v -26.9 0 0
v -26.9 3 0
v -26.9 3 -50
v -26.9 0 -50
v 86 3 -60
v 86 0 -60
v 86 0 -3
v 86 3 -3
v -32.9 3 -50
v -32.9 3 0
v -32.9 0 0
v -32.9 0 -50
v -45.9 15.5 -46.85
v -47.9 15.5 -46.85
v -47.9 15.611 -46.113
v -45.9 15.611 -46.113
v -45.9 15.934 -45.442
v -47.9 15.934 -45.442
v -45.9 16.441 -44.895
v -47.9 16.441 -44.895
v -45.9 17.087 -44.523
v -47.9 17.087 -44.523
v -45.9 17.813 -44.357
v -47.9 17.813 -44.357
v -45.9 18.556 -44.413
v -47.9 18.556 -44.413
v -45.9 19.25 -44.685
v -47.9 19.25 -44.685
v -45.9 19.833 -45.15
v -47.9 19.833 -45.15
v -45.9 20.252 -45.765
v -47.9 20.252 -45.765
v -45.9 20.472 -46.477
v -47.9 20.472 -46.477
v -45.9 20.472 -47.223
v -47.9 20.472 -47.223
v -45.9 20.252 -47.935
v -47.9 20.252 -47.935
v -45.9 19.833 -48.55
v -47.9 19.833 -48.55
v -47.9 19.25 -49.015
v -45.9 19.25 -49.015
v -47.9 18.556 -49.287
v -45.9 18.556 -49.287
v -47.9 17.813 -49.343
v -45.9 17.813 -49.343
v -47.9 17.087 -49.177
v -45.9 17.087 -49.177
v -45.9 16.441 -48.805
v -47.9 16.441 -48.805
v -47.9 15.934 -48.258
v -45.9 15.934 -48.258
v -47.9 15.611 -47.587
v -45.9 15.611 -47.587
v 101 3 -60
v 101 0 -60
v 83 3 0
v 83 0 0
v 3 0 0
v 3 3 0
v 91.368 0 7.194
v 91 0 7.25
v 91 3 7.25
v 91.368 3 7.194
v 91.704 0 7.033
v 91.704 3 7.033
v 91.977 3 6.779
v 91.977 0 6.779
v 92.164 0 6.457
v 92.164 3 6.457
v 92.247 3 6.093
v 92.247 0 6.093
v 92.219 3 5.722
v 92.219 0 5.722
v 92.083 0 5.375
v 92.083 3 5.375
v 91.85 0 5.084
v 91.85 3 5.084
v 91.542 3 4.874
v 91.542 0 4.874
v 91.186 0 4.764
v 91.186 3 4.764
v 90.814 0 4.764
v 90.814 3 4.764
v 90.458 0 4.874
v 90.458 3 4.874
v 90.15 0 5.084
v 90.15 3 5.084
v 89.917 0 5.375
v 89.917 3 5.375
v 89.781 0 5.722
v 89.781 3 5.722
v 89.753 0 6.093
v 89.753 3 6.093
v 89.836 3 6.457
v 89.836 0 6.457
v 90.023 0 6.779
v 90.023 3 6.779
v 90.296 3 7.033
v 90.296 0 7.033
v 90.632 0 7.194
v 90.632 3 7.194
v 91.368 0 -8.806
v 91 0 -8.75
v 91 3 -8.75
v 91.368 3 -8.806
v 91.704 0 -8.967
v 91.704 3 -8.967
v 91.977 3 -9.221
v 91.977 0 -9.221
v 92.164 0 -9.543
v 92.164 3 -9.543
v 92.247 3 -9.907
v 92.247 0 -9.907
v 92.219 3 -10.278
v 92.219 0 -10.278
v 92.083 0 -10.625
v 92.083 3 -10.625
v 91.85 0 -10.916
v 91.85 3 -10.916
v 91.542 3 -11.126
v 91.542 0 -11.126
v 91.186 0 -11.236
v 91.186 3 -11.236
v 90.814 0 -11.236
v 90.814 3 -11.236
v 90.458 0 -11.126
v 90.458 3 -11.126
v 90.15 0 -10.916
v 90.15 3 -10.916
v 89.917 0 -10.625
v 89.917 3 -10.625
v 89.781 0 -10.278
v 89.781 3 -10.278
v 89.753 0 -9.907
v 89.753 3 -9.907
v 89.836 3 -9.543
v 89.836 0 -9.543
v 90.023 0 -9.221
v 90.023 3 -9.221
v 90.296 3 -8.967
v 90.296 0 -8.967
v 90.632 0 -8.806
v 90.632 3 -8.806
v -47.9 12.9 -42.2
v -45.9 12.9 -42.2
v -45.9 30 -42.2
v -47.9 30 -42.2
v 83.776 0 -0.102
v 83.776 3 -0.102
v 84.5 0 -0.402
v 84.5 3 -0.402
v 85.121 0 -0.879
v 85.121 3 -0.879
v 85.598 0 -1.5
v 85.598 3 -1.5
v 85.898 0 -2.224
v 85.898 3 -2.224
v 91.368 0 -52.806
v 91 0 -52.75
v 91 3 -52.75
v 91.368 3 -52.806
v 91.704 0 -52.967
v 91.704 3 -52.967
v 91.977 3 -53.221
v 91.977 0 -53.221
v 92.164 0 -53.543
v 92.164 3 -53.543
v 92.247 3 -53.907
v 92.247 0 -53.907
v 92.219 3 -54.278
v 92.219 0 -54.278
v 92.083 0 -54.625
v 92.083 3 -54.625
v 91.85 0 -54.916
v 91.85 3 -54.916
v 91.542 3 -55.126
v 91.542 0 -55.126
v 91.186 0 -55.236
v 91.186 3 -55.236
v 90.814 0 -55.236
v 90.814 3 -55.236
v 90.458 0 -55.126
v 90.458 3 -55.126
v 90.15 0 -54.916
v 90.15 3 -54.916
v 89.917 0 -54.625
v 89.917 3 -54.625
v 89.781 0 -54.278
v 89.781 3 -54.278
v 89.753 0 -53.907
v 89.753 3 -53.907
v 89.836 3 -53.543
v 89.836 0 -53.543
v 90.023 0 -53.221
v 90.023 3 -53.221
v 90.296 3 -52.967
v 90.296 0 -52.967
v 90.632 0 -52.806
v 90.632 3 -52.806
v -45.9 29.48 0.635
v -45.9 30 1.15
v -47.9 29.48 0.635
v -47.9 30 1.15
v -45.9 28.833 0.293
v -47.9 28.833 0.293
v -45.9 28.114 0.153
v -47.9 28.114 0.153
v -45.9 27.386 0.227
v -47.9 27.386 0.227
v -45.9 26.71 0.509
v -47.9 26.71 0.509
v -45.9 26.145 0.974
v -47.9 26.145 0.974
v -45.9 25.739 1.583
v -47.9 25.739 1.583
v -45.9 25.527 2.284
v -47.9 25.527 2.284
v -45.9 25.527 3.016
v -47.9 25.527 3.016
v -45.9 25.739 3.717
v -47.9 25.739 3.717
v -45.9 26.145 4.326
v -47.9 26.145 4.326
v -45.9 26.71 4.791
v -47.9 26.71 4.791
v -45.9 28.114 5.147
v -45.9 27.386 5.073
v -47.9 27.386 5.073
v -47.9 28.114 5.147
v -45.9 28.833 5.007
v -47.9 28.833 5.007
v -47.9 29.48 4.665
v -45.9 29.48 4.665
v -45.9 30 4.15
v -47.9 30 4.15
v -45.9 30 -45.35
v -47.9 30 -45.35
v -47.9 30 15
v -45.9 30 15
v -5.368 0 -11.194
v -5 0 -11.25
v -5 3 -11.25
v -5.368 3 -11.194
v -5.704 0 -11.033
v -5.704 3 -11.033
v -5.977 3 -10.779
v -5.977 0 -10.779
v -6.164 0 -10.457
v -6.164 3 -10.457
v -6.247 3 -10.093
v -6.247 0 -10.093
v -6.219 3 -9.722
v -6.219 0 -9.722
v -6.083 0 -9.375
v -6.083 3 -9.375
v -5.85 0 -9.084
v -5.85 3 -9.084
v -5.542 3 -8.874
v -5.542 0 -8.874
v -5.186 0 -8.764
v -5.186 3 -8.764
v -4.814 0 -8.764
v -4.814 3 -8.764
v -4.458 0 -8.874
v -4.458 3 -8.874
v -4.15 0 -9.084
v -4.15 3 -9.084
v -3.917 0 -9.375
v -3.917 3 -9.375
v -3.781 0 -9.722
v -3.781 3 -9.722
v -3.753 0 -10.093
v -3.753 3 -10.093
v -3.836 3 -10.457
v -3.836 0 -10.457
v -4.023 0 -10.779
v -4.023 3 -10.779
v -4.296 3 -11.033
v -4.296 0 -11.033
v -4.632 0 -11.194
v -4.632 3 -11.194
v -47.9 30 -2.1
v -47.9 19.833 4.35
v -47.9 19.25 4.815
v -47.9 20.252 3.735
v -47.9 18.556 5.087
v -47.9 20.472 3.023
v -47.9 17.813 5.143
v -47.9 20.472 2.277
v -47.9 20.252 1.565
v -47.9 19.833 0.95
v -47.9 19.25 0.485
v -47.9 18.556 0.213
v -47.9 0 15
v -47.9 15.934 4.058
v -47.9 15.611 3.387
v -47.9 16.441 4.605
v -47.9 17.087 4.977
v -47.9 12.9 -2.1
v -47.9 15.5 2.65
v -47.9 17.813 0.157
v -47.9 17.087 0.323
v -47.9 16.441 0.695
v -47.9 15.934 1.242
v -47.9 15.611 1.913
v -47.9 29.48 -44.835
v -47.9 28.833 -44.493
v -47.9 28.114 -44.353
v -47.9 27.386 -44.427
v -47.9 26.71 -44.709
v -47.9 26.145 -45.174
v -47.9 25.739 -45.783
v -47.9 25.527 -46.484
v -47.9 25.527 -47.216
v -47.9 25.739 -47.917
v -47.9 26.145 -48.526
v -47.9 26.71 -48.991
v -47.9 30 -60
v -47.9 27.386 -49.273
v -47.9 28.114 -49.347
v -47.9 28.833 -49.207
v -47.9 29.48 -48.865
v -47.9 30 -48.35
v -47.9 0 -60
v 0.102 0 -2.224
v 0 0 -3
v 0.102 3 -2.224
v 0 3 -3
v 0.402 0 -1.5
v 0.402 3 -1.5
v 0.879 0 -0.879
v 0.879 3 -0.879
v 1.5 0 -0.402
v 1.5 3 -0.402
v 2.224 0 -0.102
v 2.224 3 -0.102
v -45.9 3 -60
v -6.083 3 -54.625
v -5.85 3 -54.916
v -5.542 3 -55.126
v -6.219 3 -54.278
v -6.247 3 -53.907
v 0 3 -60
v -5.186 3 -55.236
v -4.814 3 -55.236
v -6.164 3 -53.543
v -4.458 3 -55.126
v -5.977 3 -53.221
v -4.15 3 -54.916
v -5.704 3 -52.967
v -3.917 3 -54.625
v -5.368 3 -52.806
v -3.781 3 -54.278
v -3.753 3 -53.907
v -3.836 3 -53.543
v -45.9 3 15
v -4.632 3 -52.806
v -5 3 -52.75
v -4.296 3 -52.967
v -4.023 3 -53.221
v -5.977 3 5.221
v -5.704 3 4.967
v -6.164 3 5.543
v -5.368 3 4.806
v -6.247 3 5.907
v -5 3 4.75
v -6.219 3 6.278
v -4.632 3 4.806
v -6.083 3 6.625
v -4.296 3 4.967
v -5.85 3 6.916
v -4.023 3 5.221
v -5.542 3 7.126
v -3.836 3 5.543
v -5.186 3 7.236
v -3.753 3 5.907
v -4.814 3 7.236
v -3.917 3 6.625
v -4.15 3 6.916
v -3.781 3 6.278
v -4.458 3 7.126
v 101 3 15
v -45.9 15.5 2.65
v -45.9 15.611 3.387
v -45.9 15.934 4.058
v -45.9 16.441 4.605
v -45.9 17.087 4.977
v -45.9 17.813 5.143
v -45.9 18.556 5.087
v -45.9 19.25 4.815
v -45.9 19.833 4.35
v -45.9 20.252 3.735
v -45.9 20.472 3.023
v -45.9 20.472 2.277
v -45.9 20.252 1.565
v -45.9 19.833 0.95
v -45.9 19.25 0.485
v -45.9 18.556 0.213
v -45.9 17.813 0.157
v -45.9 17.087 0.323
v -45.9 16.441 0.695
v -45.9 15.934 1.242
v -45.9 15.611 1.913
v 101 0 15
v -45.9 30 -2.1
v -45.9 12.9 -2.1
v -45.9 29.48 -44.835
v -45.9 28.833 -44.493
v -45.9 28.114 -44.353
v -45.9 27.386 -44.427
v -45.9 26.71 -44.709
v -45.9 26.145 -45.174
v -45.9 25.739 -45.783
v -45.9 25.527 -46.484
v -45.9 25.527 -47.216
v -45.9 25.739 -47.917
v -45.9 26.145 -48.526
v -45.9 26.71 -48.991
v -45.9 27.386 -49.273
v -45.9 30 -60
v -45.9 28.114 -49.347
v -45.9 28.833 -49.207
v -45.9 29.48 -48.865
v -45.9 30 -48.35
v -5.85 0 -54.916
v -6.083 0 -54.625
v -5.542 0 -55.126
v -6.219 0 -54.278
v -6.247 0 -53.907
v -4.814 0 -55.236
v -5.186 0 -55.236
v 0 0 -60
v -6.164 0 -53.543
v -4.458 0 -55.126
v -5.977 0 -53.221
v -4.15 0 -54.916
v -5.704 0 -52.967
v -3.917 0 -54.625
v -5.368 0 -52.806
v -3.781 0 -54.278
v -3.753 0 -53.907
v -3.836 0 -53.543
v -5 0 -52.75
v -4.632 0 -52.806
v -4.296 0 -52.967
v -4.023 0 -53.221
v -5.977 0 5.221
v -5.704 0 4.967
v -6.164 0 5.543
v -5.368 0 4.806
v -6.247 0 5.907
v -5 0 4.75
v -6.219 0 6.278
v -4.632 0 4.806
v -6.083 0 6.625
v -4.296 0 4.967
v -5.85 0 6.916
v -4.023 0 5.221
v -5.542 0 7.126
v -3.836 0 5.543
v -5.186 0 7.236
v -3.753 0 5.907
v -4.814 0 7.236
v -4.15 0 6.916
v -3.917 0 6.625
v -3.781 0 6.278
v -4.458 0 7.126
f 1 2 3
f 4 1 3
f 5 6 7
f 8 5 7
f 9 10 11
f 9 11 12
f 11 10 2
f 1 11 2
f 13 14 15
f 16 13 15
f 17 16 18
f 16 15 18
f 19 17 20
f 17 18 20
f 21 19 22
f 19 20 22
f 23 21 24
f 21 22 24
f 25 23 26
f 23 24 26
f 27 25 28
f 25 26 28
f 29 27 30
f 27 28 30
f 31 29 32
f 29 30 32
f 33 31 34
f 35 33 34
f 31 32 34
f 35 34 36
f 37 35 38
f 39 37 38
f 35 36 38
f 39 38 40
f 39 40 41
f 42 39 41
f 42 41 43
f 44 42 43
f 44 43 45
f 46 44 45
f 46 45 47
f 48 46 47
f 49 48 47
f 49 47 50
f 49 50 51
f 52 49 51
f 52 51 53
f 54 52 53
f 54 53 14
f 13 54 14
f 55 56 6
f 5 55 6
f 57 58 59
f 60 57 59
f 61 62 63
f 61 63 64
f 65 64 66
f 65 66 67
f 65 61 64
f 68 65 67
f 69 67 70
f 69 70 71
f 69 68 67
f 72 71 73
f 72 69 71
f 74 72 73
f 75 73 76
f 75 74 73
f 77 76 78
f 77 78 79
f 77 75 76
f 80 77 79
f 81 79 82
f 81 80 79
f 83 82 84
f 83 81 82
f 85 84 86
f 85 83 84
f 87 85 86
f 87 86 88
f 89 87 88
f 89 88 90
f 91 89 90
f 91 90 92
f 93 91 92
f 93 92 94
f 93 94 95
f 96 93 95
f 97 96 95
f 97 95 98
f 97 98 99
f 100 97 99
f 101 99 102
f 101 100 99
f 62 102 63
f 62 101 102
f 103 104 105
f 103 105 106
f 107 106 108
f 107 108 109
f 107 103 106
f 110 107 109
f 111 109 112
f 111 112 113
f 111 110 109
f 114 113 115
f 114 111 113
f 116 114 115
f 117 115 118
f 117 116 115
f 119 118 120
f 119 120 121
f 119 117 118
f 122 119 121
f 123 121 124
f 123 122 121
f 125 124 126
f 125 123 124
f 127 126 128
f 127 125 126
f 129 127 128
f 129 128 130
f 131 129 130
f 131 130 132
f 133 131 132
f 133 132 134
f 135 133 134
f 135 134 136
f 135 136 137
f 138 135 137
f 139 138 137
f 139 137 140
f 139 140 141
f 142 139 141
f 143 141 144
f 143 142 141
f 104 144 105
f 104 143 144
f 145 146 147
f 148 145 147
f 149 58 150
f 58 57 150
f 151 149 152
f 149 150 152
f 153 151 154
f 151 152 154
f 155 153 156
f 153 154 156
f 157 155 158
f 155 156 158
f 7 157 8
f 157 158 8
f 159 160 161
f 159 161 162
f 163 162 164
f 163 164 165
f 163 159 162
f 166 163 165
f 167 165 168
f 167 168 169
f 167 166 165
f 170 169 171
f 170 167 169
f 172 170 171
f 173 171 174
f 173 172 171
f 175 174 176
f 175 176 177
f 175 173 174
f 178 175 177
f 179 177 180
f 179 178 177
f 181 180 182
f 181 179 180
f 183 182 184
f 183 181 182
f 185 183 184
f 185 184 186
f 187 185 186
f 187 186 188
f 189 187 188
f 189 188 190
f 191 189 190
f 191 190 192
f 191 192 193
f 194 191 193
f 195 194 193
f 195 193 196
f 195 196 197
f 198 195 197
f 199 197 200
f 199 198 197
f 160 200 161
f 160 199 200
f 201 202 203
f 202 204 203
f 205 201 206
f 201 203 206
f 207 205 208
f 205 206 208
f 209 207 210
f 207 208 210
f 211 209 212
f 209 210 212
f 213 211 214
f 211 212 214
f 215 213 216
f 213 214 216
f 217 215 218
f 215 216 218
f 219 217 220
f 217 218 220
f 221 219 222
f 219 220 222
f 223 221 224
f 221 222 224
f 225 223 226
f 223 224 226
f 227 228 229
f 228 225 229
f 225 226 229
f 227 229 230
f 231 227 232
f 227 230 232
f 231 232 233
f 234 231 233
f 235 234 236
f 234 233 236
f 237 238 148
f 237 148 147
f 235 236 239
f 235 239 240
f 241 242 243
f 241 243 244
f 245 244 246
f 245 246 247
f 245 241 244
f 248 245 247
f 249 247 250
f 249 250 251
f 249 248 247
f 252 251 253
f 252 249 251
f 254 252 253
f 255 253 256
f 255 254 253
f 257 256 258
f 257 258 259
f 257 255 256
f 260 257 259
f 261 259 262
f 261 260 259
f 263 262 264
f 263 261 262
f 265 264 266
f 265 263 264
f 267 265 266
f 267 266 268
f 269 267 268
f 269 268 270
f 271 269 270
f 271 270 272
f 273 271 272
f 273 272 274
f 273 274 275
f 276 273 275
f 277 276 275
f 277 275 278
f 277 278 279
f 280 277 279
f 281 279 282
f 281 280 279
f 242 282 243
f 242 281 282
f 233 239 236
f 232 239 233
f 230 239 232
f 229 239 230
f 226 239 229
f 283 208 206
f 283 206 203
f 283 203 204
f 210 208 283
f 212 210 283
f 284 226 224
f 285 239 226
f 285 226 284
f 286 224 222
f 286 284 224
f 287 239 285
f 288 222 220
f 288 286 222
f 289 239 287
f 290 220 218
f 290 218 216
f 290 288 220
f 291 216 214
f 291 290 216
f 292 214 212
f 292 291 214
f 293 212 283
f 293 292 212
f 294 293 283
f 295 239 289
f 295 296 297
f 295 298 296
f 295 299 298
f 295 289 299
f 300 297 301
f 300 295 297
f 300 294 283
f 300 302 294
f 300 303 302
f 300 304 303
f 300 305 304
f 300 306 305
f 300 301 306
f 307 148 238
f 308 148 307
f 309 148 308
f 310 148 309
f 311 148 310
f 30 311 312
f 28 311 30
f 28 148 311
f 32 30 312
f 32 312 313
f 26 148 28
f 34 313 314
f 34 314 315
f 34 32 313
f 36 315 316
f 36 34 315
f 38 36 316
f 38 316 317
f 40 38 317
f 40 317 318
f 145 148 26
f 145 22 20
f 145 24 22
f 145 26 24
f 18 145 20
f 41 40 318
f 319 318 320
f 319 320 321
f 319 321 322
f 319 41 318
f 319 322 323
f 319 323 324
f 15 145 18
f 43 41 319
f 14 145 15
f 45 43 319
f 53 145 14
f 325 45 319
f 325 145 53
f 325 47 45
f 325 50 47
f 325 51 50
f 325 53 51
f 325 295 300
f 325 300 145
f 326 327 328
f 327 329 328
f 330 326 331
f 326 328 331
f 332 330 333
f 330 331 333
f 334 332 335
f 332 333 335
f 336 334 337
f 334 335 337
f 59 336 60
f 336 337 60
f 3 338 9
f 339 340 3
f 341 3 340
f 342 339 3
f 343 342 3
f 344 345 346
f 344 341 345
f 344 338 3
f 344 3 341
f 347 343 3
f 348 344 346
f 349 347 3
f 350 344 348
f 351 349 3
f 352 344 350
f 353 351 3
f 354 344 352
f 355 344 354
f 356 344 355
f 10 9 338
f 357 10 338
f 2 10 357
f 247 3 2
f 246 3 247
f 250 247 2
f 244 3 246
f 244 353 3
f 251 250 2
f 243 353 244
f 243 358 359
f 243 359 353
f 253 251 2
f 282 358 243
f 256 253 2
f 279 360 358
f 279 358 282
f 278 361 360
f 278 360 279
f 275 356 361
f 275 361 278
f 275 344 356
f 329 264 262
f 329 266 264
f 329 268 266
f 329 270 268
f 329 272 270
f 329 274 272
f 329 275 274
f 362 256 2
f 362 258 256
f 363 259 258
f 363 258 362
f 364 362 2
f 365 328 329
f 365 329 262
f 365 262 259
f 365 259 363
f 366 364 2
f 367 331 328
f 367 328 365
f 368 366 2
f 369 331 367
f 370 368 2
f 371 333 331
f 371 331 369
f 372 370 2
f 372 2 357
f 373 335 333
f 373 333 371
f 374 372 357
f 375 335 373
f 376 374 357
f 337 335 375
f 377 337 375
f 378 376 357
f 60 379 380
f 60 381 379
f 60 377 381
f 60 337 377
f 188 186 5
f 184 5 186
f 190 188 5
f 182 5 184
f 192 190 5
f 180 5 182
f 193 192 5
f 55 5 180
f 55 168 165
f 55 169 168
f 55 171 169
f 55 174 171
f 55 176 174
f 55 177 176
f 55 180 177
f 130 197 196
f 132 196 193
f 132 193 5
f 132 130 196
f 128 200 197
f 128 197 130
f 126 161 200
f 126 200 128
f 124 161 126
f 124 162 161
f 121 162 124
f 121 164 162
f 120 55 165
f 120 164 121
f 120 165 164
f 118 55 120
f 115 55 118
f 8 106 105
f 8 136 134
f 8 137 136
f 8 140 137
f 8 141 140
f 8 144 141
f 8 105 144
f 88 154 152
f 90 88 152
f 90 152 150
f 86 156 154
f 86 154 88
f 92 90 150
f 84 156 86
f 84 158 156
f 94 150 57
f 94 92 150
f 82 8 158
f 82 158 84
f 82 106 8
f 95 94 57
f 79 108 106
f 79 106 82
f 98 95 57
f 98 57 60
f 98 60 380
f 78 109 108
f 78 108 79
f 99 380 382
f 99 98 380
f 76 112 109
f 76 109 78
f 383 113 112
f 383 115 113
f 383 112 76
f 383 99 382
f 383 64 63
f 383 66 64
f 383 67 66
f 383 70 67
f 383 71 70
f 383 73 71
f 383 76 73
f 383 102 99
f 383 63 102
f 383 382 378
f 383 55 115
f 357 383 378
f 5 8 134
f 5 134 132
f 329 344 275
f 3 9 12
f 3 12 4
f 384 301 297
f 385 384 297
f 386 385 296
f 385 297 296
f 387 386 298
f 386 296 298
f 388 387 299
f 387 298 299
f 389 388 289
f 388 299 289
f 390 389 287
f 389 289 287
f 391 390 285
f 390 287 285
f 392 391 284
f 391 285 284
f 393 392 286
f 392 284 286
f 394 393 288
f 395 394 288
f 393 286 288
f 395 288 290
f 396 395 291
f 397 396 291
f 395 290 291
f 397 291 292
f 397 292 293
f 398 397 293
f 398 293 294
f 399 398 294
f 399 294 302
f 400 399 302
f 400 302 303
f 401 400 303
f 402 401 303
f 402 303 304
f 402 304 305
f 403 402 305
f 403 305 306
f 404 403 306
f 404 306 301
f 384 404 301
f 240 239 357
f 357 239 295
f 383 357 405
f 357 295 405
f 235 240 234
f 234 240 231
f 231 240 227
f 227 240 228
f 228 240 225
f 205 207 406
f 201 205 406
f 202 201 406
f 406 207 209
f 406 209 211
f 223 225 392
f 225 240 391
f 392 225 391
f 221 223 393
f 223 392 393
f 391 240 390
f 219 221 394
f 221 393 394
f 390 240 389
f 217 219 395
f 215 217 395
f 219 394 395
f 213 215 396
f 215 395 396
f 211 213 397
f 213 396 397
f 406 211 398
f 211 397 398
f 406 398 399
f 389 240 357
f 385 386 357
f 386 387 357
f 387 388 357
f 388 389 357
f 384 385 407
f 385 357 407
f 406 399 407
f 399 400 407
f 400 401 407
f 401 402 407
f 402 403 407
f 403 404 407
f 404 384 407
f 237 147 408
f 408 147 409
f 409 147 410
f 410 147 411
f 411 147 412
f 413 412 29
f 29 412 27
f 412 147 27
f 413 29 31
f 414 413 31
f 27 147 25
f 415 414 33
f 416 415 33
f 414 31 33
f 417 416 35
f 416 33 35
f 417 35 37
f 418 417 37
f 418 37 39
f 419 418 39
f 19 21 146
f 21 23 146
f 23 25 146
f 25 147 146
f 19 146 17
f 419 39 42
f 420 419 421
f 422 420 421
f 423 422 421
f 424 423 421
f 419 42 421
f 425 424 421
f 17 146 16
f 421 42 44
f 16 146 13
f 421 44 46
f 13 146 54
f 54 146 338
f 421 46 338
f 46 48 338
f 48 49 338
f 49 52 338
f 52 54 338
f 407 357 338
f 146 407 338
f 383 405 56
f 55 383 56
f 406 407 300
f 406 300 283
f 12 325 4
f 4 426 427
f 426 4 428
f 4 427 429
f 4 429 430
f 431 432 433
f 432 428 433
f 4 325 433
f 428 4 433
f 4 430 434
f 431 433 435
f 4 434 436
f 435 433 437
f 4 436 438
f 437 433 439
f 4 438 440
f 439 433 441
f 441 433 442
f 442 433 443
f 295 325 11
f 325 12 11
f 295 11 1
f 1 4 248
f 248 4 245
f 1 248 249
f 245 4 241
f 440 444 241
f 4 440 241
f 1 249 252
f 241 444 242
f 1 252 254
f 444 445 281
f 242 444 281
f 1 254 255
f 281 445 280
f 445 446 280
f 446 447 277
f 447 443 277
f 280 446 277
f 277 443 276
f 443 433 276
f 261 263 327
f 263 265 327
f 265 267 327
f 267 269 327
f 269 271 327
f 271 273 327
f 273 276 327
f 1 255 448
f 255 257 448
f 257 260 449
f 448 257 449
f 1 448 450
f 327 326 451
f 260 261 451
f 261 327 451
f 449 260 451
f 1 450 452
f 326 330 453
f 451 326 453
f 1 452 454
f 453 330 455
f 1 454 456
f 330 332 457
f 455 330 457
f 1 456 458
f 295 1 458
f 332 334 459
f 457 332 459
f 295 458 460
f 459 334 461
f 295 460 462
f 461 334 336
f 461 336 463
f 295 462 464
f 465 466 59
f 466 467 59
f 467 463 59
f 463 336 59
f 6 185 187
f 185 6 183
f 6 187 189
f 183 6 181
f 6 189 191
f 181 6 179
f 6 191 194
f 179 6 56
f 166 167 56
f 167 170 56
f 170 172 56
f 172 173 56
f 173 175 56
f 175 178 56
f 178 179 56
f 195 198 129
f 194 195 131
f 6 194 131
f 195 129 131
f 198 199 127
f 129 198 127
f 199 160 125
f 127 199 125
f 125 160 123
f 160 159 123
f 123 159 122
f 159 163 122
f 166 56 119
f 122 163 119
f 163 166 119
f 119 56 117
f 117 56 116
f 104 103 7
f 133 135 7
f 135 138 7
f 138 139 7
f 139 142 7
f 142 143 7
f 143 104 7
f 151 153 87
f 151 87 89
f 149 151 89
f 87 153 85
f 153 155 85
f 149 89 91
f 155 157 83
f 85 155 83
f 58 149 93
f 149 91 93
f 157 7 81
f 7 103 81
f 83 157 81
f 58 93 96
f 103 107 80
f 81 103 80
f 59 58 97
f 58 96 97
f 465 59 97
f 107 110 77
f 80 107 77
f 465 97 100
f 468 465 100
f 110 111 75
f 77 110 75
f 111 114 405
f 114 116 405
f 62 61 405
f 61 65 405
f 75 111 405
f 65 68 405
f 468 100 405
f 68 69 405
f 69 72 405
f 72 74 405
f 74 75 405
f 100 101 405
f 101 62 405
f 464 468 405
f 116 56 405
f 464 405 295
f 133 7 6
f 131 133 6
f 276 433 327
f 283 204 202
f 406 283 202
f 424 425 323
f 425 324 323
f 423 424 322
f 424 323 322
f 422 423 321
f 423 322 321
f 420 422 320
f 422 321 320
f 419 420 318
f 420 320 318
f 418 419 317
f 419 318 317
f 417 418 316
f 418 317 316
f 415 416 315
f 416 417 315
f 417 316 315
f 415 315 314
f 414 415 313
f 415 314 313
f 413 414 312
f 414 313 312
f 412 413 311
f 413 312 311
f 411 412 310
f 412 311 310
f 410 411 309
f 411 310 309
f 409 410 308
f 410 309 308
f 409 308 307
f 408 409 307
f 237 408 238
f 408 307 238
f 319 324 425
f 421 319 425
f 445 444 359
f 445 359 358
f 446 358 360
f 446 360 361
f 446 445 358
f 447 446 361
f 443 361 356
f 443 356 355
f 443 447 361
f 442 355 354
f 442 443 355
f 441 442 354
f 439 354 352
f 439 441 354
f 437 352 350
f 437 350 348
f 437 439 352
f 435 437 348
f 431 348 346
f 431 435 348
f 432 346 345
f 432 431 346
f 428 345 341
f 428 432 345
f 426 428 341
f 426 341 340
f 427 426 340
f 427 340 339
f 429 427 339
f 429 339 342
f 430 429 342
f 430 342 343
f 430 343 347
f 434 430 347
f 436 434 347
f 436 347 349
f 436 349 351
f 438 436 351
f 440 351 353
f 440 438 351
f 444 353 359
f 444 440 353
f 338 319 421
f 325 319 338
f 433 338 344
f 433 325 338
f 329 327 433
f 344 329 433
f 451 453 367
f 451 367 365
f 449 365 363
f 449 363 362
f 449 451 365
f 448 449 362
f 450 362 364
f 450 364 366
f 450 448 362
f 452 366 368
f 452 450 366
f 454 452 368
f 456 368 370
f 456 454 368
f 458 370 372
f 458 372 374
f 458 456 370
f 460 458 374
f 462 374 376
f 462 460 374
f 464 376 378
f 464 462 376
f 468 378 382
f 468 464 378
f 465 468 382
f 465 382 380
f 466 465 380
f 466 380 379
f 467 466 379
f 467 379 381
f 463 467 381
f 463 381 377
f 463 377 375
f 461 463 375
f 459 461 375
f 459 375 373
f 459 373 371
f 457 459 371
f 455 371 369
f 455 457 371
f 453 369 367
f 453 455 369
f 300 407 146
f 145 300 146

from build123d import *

# Parameters (mm, degrees)
SKETCH_1_R          = 1.25
EXTRUDE_1_DEPTH     = 3
FILLET_1_R          = 3
SKETCH_2_W          = 75
SKETCH_2_H          = 3
EXTRUDE_2_DEPTH     = 32.9
SKETCH_3_W          = 2
SKETCH_3_H          = 75
EXTRUDE_4_DEPTH     = 30
CUT_EXTRUDE_1_REACH = 164.076
SKETCH_5_W          = 40.1
SKETCH_5_H          = 20.1
CUT_EXTRUDE_2_REACH = 165.891
SKETCH_6_R          = 2.5
SKETCH_7_W          = 2
SKETCH_7_H          = 75
CUT_EXTRUDE_3_DEPTH = 3
SKETCH_9_W          = 6
SKETCH_9_H          = 50
CUT_EXTRUDE_4_DEPTH = 121.540449642


with BuildPart() as part:
    # 草图1 → 凸台-拉伸1 (new body)
    with BuildSketch(Plane(origin=(0, 0, 0), x_dir=(1, 0, 0), z_dir=(0, 1, 0))):
        Polygon((0, 0), (0, 60), (-15, 60), (-15, -15), (101, -15), (101, 60), (86, 60), (86, 0), align=None)
        with Locations(Location((-5, 54, 0), (0, 0, 270))):
            Circle(SKETCH_1_R, mode=Mode.SUBTRACT)
        with Locations(Location((-5, -6, 0), (0, 0, 90))):
            Circle(SKETCH_1_R, mode=Mode.SUBTRACT)
        with Locations(Location((91, 54, 0), (0, 0, 270))):
            Circle(SKETCH_1_R, mode=Mode.SUBTRACT)
        with Locations(Location((91, -6, 0), (0, 0, 270))):
            Circle(SKETCH_1_R, mode=Mode.SUBTRACT)
        with Locations(Location((91, 10, 0), (0, 0, 270))):
            Circle(SKETCH_1_R, mode=Mode.SUBTRACT)
        with Locations(Location((-5, 10, 0), (0, 0, 90))):
            Circle(SKETCH_1_R, mode=Mode.SUBTRACT)
    extrude(amount=EXTRUDE_1_DEPTH)

    # 圆角1
    fillet_1_edges = [part.edges().sort_by_distance(p)[0] for p in [
        (86, 1.5, 0),
        (0, 1.5, 0),
    ]]
    fillet(fillet_1_edges, radius=FILLET_1_R)

    # 草图2 → 凸台-拉伸2 (add)
    with BuildSketch(Plane.ZY.offset(15)):
        with Locations((-22.5, 1.5)):
            Rectangle(SKETCH_2_W, SKETCH_2_H)
    extrude(amount=EXTRUDE_2_DEPTH)

    # 草图3 → 凸台-拉伸4 (add)
    with BuildSketch(Plane(origin=(0, 3, 0), x_dir=(1, 0, 0), z_dir=(0, 1, 0))):
        with Locations((-46.9, 22.5)):
            Rectangle(SKETCH_3_W, SKETCH_3_H)
    extrude(amount=EXTRUDE_4_DEPTH)

    # 草图5 → 切除-拉伸1 (cut, up to next)
    with BuildSketch(Plane(origin=(-45.9, 0, 0), x_dir=(0, 0, -1), z_dir=(1, 0, 0)), mode=Mode.PRIVATE) as cut_extrude_1_sk1:
        with Locations((22.15, 22.95)):
            Rectangle(SKETCH_5_W, SKETCH_5_H)
    cut_extrude_1_tool1 = extrude(cut_extrude_1_sk1.sketch, amount=-CUT_EXTRUDE_1_REACH, mode=Mode.PRIVATE) & part.part
    add(cut_extrude_1_tool1.solids().sort_by_distance((-45.9, 22.95, -22.15))[0], mode=Mode.SUBTRACT)

    # 草图6 → 切除-拉伸2 (cut, up to next)
    with BuildSketch(Plane.ZY.offset(47.9), mode=Mode.PRIVATE) as cut_extrude_2_sk1:
        with Locations(Location((-46.85, 18, 0), (0, 0, 270))):
            Circle(SKETCH_6_R)
    cut_extrude_2_tool1 = extrude(cut_extrude_2_sk1.sketch, amount=-CUT_EXTRUDE_2_REACH, mode=Mode.PRIVATE) & part.part
    # 草图6 → 切除-拉伸2 (cut, up to next)
    with BuildSketch(Plane.ZY.offset(47.9), mode=Mode.PRIVATE) as cut_extrude_2_sk2:
        with Locations(Location((-46.85, 28, 0), (0, 0, 270))):
            Circle(SKETCH_6_R)
    cut_extrude_2_tool2 = extrude(cut_extrude_2_sk2.sketch, amount=-CUT_EXTRUDE_2_REACH, mode=Mode.PRIVATE) & part.part
    # 草图6 → 切除-拉伸2 (cut, up to next)
    with BuildSketch(Plane.ZY.offset(47.9), mode=Mode.PRIVATE) as cut_extrude_2_sk3:
        with Locations(Location((2.65, 18, 0), (0, 0, 270))):
            Circle(SKETCH_6_R)
    cut_extrude_2_tool3 = extrude(cut_extrude_2_sk3.sketch, amount=-CUT_EXTRUDE_2_REACH, mode=Mode.PRIVATE) & part.part
    # 草图6 → 切除-拉伸2 (cut, up to next)
    with BuildSketch(Plane.ZY.offset(47.9), mode=Mode.PRIVATE) as cut_extrude_2_sk4:
        with Locations(Location((2.65, 28, 0), (0, 0, 270))):
            Circle(SKETCH_6_R)
    cut_extrude_2_tool4 = extrude(cut_extrude_2_sk4.sketch, amount=-CUT_EXTRUDE_2_REACH, mode=Mode.PRIVATE) & part.part
    add(cut_extrude_2_tool1.solids().sort_by_distance((-47.9, 18, -46.85))[0], mode=Mode.SUBTRACT)
    add(cut_extrude_2_tool2.solids().sort_by_distance((-47.9, 28, -46.85))[0], mode=Mode.SUBTRACT)
    add(cut_extrude_2_tool3.solids().sort_by_distance((-47.9, 18, 2.65))[0], mode=Mode.SUBTRACT)
    add(cut_extrude_2_tool4.solids().sort_by_distance((-47.9, 28, 2.65))[0], mode=Mode.SUBTRACT)

    # 草图7 → 切除-拉伸3 (cut)
    with BuildSketch(Plane(origin=(0, 33, 0), x_dir=(1, 0, 0), z_dir=(0, 1, 0))):
        with Locations((-46.9, 22.5)):
            Rectangle(SKETCH_7_W, SKETCH_7_H)
    extrude(amount=-CUT_EXTRUDE_3_DEPTH, mode=Mode.SUBTRACT)

    # 草图9 → 切除-拉伸4 (cut, through all)
    with BuildSketch(Plane(origin=(0, 3, 0), x_dir=(1, 0, 0), z_dir=(0, 1, 0))):
        with Locations((-29.9, 25)):
            Rectangle(SKETCH_9_W, SKETCH_9_H)
    extrude(amount=-CUT_EXTRUDE_4_DEPTH, mode=Mode.SUBTRACT)


solid = part.part
